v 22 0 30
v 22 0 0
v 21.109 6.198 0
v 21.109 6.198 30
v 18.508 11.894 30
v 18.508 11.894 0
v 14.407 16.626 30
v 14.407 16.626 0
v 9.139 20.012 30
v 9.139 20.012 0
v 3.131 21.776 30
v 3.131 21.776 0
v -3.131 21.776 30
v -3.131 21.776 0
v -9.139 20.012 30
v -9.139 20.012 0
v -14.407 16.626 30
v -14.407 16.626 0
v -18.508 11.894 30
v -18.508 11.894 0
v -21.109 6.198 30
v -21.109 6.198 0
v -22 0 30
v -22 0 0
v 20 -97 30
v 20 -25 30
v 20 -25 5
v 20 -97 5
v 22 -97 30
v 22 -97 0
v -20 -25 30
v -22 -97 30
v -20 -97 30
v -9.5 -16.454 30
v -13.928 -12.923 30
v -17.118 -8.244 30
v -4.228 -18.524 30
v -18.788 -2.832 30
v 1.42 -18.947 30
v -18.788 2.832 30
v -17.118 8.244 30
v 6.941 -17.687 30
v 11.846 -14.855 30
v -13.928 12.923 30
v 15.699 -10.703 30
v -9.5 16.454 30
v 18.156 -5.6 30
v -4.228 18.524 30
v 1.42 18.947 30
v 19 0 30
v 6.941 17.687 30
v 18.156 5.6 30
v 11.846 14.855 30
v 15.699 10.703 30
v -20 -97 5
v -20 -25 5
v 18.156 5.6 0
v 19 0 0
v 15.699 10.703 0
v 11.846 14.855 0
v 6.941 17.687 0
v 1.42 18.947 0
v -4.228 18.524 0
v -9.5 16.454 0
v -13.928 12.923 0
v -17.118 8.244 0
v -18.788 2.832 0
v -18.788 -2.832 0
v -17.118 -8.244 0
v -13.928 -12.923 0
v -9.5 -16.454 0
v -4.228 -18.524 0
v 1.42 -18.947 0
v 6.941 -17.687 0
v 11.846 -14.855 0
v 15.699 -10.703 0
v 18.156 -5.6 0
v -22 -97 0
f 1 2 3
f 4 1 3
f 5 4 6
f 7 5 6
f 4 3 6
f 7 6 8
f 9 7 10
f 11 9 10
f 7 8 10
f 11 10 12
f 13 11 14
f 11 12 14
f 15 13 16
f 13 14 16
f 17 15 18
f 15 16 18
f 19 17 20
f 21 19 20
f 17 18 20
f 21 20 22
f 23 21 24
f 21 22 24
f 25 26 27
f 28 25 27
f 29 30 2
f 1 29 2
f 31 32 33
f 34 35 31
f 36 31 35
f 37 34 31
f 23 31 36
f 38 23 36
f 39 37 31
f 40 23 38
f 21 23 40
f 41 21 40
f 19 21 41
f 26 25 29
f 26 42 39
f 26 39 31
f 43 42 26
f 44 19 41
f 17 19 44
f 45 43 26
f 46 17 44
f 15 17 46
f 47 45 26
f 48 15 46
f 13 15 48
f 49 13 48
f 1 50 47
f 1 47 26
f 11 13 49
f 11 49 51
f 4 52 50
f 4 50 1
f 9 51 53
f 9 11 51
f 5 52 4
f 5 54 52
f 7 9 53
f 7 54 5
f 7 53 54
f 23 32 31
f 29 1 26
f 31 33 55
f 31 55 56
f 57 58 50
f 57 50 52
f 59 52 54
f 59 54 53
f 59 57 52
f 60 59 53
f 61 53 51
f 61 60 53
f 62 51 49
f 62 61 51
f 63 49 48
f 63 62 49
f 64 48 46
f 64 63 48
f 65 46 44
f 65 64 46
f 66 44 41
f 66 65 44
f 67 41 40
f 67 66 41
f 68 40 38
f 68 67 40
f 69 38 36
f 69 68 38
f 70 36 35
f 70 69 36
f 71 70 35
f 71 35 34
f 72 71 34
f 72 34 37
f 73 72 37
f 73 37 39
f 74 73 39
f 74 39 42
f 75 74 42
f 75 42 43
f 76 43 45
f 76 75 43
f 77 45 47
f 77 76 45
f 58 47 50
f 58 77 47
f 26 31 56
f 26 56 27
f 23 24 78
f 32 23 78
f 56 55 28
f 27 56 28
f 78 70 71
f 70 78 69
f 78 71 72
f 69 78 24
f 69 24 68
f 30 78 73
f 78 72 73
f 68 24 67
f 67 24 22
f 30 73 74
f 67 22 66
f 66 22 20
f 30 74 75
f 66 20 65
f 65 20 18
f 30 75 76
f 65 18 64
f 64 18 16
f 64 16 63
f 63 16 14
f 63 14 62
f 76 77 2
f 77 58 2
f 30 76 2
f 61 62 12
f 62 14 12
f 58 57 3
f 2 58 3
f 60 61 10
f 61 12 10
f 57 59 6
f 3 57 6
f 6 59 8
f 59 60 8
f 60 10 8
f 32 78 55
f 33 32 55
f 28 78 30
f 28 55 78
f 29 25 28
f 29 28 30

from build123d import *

# Parameters (mm, degrees)
SKETCH1_R           = 22
SKETCH1_R_2         = 19
BOSS_EXTRUDE1_DEPTH = 30
SKETCH2_W           = 40
SKETCH2_H           = 70
CUT_EXTRUDE1_DEPTH  = 25
SKETCH3_W           = 44
SKETCH3_H           = 13
CUT_EXTRUDE2_DEPTH  = 117.120626936
SKETCH4_W           = 40
SKETCH4_H           = 25
CUT_EXTRUDE3_DEPTH  = 25


with BuildPart() as part:
    # Sketch1 → Boss-Extrude1 (new body)
    # profile 1 of 2: a face of its own
    with BuildSketch(Plane.XY):
        Circle(SKETCH1_R)
        Circle(SKETCH1_R_2, mode=Mode.SUBTRACT)
    # profile 2 of 2: a face of its own
    with BuildSketch(Plane.XY):
        with BuildLine():
            Line((22, -110), (22, 0))
            ThreePointArc((22, 0), (0, -22), (-22, 0))
            Line((-22, 0), (-22, -110))
            Line((-22, -110), (22, -110))
        make_face()
    extrude(amount=BOSS_EXTRUDE1_DEPTH)

    # Sketch2 → Cut-Extrude1 (cut)
    with BuildSketch(Plane.XY.offset(30)):
        with Locations((0, -60)):
            Rectangle(SKETCH2_W, SKETCH2_H)
    extrude(amount=-CUT_EXTRUDE1_DEPTH, mode=Mode.SUBTRACT)

    # Sketch3 → Cut-Extrude2 (cut, through all)
    with BuildSketch(Plane.XY.offset(30)):
        with Locations((0, -103.5)):
            Rectangle(SKETCH3_W, SKETCH3_H)
    extrude(amount=-CUT_EXTRUDE2_DEPTH, mode=Mode.SUBTRACT)

    # Sketch4 → Cut-Extrude3 (cut)
    with BuildSketch(Plane(origin=(0, -95, 0), x_dir=(1, 0, 0), z_dir=(0, 1, 0))):
        with Locations((0, -17.5)):
            Rectangle(SKETCH4_W, SKETCH4_H)
    extrude(amount=-CUT_EXTRUDE3_DEPTH, mode=Mode.SUBTRACT)


solid = part.part
